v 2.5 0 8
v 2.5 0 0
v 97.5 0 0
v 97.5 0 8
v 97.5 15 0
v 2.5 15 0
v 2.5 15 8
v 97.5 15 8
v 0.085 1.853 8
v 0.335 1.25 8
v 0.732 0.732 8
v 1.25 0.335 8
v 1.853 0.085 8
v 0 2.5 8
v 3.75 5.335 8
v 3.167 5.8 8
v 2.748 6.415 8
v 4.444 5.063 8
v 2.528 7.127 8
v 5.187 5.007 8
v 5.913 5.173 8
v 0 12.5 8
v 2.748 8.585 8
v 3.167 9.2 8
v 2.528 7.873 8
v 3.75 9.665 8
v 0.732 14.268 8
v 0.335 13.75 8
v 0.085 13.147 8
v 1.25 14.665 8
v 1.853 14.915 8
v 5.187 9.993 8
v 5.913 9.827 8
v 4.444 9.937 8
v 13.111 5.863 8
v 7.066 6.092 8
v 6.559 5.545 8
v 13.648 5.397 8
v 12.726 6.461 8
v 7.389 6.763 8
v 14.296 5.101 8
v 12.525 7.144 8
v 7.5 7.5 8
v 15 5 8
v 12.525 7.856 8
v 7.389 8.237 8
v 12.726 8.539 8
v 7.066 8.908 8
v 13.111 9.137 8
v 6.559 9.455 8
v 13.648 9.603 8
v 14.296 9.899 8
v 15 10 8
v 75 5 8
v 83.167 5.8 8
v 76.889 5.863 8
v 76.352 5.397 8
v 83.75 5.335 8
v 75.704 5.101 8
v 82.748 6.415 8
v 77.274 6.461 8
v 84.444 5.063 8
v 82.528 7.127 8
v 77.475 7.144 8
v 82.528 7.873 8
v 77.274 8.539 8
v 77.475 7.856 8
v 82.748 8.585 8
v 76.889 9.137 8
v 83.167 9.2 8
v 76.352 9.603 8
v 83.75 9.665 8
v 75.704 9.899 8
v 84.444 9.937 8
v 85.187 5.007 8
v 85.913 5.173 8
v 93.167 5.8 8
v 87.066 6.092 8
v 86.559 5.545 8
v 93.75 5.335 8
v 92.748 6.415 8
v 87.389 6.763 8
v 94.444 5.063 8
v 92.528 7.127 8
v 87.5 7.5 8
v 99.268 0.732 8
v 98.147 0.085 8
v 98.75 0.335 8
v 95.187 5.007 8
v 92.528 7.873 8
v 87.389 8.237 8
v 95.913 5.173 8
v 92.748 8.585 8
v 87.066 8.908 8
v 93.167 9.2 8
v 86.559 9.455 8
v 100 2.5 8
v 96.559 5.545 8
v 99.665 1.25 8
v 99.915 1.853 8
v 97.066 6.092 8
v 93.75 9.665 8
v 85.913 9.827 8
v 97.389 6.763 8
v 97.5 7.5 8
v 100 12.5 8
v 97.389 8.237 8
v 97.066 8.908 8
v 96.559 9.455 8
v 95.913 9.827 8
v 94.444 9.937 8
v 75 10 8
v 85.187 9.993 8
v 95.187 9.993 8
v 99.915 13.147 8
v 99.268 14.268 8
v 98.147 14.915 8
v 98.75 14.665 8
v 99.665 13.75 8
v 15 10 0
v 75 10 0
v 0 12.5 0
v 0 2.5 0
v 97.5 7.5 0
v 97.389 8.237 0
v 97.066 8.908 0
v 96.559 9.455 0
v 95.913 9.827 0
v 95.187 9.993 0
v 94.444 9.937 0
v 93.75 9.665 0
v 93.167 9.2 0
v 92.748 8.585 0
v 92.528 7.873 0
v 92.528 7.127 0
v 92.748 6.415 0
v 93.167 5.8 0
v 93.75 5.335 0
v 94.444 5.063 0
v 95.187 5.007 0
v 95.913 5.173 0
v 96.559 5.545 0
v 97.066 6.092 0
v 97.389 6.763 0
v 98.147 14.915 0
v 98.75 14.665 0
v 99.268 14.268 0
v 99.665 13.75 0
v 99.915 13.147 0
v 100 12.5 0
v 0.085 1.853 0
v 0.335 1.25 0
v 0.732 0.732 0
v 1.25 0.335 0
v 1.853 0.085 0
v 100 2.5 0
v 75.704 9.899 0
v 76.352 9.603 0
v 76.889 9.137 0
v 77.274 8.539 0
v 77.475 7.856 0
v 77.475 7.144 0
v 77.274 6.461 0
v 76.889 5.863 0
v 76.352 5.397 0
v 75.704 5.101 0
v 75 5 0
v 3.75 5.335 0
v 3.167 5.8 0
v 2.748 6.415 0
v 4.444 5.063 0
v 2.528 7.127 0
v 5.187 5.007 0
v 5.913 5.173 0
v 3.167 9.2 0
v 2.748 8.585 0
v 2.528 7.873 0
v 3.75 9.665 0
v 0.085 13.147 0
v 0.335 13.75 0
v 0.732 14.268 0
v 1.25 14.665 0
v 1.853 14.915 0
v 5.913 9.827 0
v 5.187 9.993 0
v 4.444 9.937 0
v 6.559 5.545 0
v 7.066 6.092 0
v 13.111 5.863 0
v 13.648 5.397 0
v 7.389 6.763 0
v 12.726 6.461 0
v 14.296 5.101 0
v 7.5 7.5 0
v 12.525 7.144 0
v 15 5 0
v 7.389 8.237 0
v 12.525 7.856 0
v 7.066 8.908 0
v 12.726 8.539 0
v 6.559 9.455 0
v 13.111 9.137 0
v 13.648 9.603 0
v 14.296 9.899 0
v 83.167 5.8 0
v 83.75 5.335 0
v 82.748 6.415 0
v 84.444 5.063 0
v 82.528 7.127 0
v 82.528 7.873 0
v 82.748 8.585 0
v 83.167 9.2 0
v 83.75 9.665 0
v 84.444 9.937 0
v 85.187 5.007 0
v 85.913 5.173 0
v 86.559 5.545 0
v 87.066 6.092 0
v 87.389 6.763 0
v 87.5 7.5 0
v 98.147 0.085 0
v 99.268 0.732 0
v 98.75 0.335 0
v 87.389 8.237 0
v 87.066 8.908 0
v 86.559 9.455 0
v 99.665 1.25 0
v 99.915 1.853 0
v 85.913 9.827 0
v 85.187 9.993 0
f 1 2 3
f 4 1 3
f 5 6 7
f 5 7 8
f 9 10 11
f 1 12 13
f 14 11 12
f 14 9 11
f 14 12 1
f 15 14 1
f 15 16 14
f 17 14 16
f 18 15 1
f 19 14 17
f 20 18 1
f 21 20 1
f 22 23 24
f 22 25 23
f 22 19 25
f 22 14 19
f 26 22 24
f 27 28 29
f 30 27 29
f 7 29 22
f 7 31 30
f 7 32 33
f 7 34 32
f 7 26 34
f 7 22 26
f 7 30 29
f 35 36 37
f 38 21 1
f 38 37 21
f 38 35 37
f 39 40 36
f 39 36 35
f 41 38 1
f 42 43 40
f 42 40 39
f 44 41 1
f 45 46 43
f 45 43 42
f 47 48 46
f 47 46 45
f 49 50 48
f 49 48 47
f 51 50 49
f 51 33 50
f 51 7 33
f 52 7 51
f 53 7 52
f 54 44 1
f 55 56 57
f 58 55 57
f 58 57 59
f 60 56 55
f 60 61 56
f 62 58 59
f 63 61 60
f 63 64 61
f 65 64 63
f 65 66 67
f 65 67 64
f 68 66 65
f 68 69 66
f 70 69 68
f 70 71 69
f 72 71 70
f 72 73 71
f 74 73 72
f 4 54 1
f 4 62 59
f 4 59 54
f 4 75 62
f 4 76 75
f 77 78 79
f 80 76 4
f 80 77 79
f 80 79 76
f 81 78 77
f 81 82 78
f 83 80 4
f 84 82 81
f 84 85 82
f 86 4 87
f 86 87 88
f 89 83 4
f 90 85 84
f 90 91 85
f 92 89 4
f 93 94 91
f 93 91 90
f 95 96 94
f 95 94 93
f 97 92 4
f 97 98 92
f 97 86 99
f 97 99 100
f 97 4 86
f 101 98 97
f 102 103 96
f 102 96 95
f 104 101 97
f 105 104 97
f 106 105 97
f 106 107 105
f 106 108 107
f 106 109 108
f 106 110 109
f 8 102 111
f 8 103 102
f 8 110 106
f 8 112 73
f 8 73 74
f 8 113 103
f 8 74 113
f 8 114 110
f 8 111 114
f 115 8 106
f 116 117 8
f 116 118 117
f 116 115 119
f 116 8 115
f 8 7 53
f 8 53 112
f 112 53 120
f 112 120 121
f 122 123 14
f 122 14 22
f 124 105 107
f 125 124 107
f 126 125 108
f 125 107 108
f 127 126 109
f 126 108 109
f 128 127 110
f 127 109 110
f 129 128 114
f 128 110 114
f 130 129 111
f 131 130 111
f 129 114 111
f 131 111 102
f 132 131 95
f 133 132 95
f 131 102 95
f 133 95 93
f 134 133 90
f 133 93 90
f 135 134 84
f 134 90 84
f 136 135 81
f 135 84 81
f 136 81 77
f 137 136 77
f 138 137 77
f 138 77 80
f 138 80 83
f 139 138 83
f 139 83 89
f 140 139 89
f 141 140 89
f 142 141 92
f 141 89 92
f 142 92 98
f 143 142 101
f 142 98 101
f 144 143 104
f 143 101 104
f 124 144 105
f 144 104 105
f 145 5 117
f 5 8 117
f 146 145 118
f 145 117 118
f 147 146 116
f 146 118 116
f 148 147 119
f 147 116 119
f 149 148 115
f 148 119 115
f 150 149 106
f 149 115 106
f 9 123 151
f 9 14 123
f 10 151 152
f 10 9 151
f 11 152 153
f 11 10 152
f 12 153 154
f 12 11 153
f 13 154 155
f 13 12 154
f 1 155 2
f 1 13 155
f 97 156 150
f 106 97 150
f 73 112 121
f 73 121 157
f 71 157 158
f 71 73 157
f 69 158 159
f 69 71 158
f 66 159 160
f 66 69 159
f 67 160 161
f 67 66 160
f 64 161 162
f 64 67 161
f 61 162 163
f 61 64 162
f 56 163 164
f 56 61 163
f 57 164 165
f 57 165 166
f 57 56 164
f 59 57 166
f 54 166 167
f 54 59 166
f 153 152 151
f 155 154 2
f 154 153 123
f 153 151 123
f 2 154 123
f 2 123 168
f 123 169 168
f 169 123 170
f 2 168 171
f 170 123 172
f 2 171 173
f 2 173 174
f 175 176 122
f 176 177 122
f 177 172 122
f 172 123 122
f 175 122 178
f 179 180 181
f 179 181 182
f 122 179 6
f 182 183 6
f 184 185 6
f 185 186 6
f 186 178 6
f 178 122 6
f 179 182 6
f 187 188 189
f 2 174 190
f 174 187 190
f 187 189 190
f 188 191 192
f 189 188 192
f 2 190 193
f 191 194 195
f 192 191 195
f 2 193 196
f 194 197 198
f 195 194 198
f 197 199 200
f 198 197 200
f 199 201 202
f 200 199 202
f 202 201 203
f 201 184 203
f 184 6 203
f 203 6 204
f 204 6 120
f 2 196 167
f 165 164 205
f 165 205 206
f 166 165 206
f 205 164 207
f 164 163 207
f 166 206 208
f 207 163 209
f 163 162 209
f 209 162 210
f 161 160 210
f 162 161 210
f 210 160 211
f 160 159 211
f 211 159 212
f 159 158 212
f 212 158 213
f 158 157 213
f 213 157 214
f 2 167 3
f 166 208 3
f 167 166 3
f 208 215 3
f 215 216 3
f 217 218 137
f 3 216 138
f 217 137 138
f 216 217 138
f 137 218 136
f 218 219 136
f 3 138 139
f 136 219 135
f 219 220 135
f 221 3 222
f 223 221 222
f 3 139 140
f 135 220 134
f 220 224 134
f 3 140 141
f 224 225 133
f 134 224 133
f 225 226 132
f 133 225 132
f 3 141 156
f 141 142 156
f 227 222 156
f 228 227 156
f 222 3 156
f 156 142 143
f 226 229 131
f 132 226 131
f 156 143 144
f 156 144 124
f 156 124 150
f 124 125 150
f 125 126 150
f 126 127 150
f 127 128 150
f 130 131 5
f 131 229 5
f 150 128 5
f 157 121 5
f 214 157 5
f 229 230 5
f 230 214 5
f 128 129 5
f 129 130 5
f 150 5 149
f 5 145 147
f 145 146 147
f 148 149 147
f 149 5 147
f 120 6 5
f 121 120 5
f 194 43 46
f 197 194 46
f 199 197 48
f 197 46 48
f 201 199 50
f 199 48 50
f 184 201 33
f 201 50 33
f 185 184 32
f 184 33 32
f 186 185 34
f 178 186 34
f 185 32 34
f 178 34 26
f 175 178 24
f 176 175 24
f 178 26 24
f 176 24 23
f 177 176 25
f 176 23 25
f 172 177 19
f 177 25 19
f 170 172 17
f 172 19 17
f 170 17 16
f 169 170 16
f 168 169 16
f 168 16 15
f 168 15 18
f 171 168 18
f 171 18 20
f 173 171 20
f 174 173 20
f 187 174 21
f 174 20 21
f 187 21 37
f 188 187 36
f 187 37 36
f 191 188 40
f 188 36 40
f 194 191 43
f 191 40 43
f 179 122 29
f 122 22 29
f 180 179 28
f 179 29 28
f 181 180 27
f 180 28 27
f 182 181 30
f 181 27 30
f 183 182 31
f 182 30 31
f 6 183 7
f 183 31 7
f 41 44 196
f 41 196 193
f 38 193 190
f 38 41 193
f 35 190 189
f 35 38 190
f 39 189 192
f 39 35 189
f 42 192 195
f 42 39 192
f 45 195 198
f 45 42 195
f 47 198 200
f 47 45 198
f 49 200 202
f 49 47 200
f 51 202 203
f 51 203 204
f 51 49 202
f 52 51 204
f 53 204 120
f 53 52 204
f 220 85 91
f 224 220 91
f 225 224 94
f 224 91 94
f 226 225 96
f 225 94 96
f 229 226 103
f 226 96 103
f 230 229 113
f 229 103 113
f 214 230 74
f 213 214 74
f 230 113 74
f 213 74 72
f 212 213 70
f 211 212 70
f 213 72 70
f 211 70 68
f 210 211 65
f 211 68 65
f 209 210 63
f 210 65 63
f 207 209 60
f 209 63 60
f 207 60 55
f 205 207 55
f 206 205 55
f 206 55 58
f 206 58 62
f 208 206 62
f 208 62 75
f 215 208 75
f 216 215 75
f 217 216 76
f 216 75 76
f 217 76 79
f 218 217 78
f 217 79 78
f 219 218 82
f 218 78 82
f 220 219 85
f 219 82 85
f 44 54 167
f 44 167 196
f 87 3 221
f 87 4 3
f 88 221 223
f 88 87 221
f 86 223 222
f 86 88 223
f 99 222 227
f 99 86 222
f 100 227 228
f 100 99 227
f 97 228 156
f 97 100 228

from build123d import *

# Parameters (mm, degrees)
SKETCH_1_W          = 100
SKETCH_1_H          = 15
EXTRUDE_1_DEPTH     = 8
SKETCH_2_R          = 2.5
CUT_EXTRUDE_2_DEPTH = 8
FILLET_2_R          = 2.5


with BuildPart() as part:
    # Эскиз1 → Вытянуть1 (new body)
    with BuildSketch(Plane.XY):
        with Locations((50, 7.5)):
            Rectangle(SKETCH_1_W, SKETCH_1_H)
    extrude(amount=EXTRUDE_1_DEPTH)

    # Эскиз2 → Вытянуть2 (cut)
    with BuildSketch(Plane.XY.offset(8)):
        with Locations((5, 7.5)):
            Circle(SKETCH_2_R)
        with Locations((95, 7.5)):
            Circle(SKETCH_2_R)
        with Locations((85, 7.5)):
            Circle(SKETCH_2_R)
        with BuildLine():
            Line((15, 10), (75, 10))
            ThreePointArc((75, 10), (77.5, 7.5), (75, 5))
            Line((75, 5), (15, 5))
            ThreePointArc((15, 5), (12.5, 7.5), (15, 10))
        make_face()
    extrude(amount=-CUT_EXTRUDE_2_DEPTH, mode=Mode.SUBTRACT)

    # Скругление2
    fillet_2_edges = [part.edges().sort_by_distance(p)[0] for p in [
        (0, 15, 4),
        (100, 15, 4),
        (100, 0, 4),
        (0, 0, 4),
    ]]
    fillet(fillet_2_edges, radius=FILLET_2_R)


solid = part.part
